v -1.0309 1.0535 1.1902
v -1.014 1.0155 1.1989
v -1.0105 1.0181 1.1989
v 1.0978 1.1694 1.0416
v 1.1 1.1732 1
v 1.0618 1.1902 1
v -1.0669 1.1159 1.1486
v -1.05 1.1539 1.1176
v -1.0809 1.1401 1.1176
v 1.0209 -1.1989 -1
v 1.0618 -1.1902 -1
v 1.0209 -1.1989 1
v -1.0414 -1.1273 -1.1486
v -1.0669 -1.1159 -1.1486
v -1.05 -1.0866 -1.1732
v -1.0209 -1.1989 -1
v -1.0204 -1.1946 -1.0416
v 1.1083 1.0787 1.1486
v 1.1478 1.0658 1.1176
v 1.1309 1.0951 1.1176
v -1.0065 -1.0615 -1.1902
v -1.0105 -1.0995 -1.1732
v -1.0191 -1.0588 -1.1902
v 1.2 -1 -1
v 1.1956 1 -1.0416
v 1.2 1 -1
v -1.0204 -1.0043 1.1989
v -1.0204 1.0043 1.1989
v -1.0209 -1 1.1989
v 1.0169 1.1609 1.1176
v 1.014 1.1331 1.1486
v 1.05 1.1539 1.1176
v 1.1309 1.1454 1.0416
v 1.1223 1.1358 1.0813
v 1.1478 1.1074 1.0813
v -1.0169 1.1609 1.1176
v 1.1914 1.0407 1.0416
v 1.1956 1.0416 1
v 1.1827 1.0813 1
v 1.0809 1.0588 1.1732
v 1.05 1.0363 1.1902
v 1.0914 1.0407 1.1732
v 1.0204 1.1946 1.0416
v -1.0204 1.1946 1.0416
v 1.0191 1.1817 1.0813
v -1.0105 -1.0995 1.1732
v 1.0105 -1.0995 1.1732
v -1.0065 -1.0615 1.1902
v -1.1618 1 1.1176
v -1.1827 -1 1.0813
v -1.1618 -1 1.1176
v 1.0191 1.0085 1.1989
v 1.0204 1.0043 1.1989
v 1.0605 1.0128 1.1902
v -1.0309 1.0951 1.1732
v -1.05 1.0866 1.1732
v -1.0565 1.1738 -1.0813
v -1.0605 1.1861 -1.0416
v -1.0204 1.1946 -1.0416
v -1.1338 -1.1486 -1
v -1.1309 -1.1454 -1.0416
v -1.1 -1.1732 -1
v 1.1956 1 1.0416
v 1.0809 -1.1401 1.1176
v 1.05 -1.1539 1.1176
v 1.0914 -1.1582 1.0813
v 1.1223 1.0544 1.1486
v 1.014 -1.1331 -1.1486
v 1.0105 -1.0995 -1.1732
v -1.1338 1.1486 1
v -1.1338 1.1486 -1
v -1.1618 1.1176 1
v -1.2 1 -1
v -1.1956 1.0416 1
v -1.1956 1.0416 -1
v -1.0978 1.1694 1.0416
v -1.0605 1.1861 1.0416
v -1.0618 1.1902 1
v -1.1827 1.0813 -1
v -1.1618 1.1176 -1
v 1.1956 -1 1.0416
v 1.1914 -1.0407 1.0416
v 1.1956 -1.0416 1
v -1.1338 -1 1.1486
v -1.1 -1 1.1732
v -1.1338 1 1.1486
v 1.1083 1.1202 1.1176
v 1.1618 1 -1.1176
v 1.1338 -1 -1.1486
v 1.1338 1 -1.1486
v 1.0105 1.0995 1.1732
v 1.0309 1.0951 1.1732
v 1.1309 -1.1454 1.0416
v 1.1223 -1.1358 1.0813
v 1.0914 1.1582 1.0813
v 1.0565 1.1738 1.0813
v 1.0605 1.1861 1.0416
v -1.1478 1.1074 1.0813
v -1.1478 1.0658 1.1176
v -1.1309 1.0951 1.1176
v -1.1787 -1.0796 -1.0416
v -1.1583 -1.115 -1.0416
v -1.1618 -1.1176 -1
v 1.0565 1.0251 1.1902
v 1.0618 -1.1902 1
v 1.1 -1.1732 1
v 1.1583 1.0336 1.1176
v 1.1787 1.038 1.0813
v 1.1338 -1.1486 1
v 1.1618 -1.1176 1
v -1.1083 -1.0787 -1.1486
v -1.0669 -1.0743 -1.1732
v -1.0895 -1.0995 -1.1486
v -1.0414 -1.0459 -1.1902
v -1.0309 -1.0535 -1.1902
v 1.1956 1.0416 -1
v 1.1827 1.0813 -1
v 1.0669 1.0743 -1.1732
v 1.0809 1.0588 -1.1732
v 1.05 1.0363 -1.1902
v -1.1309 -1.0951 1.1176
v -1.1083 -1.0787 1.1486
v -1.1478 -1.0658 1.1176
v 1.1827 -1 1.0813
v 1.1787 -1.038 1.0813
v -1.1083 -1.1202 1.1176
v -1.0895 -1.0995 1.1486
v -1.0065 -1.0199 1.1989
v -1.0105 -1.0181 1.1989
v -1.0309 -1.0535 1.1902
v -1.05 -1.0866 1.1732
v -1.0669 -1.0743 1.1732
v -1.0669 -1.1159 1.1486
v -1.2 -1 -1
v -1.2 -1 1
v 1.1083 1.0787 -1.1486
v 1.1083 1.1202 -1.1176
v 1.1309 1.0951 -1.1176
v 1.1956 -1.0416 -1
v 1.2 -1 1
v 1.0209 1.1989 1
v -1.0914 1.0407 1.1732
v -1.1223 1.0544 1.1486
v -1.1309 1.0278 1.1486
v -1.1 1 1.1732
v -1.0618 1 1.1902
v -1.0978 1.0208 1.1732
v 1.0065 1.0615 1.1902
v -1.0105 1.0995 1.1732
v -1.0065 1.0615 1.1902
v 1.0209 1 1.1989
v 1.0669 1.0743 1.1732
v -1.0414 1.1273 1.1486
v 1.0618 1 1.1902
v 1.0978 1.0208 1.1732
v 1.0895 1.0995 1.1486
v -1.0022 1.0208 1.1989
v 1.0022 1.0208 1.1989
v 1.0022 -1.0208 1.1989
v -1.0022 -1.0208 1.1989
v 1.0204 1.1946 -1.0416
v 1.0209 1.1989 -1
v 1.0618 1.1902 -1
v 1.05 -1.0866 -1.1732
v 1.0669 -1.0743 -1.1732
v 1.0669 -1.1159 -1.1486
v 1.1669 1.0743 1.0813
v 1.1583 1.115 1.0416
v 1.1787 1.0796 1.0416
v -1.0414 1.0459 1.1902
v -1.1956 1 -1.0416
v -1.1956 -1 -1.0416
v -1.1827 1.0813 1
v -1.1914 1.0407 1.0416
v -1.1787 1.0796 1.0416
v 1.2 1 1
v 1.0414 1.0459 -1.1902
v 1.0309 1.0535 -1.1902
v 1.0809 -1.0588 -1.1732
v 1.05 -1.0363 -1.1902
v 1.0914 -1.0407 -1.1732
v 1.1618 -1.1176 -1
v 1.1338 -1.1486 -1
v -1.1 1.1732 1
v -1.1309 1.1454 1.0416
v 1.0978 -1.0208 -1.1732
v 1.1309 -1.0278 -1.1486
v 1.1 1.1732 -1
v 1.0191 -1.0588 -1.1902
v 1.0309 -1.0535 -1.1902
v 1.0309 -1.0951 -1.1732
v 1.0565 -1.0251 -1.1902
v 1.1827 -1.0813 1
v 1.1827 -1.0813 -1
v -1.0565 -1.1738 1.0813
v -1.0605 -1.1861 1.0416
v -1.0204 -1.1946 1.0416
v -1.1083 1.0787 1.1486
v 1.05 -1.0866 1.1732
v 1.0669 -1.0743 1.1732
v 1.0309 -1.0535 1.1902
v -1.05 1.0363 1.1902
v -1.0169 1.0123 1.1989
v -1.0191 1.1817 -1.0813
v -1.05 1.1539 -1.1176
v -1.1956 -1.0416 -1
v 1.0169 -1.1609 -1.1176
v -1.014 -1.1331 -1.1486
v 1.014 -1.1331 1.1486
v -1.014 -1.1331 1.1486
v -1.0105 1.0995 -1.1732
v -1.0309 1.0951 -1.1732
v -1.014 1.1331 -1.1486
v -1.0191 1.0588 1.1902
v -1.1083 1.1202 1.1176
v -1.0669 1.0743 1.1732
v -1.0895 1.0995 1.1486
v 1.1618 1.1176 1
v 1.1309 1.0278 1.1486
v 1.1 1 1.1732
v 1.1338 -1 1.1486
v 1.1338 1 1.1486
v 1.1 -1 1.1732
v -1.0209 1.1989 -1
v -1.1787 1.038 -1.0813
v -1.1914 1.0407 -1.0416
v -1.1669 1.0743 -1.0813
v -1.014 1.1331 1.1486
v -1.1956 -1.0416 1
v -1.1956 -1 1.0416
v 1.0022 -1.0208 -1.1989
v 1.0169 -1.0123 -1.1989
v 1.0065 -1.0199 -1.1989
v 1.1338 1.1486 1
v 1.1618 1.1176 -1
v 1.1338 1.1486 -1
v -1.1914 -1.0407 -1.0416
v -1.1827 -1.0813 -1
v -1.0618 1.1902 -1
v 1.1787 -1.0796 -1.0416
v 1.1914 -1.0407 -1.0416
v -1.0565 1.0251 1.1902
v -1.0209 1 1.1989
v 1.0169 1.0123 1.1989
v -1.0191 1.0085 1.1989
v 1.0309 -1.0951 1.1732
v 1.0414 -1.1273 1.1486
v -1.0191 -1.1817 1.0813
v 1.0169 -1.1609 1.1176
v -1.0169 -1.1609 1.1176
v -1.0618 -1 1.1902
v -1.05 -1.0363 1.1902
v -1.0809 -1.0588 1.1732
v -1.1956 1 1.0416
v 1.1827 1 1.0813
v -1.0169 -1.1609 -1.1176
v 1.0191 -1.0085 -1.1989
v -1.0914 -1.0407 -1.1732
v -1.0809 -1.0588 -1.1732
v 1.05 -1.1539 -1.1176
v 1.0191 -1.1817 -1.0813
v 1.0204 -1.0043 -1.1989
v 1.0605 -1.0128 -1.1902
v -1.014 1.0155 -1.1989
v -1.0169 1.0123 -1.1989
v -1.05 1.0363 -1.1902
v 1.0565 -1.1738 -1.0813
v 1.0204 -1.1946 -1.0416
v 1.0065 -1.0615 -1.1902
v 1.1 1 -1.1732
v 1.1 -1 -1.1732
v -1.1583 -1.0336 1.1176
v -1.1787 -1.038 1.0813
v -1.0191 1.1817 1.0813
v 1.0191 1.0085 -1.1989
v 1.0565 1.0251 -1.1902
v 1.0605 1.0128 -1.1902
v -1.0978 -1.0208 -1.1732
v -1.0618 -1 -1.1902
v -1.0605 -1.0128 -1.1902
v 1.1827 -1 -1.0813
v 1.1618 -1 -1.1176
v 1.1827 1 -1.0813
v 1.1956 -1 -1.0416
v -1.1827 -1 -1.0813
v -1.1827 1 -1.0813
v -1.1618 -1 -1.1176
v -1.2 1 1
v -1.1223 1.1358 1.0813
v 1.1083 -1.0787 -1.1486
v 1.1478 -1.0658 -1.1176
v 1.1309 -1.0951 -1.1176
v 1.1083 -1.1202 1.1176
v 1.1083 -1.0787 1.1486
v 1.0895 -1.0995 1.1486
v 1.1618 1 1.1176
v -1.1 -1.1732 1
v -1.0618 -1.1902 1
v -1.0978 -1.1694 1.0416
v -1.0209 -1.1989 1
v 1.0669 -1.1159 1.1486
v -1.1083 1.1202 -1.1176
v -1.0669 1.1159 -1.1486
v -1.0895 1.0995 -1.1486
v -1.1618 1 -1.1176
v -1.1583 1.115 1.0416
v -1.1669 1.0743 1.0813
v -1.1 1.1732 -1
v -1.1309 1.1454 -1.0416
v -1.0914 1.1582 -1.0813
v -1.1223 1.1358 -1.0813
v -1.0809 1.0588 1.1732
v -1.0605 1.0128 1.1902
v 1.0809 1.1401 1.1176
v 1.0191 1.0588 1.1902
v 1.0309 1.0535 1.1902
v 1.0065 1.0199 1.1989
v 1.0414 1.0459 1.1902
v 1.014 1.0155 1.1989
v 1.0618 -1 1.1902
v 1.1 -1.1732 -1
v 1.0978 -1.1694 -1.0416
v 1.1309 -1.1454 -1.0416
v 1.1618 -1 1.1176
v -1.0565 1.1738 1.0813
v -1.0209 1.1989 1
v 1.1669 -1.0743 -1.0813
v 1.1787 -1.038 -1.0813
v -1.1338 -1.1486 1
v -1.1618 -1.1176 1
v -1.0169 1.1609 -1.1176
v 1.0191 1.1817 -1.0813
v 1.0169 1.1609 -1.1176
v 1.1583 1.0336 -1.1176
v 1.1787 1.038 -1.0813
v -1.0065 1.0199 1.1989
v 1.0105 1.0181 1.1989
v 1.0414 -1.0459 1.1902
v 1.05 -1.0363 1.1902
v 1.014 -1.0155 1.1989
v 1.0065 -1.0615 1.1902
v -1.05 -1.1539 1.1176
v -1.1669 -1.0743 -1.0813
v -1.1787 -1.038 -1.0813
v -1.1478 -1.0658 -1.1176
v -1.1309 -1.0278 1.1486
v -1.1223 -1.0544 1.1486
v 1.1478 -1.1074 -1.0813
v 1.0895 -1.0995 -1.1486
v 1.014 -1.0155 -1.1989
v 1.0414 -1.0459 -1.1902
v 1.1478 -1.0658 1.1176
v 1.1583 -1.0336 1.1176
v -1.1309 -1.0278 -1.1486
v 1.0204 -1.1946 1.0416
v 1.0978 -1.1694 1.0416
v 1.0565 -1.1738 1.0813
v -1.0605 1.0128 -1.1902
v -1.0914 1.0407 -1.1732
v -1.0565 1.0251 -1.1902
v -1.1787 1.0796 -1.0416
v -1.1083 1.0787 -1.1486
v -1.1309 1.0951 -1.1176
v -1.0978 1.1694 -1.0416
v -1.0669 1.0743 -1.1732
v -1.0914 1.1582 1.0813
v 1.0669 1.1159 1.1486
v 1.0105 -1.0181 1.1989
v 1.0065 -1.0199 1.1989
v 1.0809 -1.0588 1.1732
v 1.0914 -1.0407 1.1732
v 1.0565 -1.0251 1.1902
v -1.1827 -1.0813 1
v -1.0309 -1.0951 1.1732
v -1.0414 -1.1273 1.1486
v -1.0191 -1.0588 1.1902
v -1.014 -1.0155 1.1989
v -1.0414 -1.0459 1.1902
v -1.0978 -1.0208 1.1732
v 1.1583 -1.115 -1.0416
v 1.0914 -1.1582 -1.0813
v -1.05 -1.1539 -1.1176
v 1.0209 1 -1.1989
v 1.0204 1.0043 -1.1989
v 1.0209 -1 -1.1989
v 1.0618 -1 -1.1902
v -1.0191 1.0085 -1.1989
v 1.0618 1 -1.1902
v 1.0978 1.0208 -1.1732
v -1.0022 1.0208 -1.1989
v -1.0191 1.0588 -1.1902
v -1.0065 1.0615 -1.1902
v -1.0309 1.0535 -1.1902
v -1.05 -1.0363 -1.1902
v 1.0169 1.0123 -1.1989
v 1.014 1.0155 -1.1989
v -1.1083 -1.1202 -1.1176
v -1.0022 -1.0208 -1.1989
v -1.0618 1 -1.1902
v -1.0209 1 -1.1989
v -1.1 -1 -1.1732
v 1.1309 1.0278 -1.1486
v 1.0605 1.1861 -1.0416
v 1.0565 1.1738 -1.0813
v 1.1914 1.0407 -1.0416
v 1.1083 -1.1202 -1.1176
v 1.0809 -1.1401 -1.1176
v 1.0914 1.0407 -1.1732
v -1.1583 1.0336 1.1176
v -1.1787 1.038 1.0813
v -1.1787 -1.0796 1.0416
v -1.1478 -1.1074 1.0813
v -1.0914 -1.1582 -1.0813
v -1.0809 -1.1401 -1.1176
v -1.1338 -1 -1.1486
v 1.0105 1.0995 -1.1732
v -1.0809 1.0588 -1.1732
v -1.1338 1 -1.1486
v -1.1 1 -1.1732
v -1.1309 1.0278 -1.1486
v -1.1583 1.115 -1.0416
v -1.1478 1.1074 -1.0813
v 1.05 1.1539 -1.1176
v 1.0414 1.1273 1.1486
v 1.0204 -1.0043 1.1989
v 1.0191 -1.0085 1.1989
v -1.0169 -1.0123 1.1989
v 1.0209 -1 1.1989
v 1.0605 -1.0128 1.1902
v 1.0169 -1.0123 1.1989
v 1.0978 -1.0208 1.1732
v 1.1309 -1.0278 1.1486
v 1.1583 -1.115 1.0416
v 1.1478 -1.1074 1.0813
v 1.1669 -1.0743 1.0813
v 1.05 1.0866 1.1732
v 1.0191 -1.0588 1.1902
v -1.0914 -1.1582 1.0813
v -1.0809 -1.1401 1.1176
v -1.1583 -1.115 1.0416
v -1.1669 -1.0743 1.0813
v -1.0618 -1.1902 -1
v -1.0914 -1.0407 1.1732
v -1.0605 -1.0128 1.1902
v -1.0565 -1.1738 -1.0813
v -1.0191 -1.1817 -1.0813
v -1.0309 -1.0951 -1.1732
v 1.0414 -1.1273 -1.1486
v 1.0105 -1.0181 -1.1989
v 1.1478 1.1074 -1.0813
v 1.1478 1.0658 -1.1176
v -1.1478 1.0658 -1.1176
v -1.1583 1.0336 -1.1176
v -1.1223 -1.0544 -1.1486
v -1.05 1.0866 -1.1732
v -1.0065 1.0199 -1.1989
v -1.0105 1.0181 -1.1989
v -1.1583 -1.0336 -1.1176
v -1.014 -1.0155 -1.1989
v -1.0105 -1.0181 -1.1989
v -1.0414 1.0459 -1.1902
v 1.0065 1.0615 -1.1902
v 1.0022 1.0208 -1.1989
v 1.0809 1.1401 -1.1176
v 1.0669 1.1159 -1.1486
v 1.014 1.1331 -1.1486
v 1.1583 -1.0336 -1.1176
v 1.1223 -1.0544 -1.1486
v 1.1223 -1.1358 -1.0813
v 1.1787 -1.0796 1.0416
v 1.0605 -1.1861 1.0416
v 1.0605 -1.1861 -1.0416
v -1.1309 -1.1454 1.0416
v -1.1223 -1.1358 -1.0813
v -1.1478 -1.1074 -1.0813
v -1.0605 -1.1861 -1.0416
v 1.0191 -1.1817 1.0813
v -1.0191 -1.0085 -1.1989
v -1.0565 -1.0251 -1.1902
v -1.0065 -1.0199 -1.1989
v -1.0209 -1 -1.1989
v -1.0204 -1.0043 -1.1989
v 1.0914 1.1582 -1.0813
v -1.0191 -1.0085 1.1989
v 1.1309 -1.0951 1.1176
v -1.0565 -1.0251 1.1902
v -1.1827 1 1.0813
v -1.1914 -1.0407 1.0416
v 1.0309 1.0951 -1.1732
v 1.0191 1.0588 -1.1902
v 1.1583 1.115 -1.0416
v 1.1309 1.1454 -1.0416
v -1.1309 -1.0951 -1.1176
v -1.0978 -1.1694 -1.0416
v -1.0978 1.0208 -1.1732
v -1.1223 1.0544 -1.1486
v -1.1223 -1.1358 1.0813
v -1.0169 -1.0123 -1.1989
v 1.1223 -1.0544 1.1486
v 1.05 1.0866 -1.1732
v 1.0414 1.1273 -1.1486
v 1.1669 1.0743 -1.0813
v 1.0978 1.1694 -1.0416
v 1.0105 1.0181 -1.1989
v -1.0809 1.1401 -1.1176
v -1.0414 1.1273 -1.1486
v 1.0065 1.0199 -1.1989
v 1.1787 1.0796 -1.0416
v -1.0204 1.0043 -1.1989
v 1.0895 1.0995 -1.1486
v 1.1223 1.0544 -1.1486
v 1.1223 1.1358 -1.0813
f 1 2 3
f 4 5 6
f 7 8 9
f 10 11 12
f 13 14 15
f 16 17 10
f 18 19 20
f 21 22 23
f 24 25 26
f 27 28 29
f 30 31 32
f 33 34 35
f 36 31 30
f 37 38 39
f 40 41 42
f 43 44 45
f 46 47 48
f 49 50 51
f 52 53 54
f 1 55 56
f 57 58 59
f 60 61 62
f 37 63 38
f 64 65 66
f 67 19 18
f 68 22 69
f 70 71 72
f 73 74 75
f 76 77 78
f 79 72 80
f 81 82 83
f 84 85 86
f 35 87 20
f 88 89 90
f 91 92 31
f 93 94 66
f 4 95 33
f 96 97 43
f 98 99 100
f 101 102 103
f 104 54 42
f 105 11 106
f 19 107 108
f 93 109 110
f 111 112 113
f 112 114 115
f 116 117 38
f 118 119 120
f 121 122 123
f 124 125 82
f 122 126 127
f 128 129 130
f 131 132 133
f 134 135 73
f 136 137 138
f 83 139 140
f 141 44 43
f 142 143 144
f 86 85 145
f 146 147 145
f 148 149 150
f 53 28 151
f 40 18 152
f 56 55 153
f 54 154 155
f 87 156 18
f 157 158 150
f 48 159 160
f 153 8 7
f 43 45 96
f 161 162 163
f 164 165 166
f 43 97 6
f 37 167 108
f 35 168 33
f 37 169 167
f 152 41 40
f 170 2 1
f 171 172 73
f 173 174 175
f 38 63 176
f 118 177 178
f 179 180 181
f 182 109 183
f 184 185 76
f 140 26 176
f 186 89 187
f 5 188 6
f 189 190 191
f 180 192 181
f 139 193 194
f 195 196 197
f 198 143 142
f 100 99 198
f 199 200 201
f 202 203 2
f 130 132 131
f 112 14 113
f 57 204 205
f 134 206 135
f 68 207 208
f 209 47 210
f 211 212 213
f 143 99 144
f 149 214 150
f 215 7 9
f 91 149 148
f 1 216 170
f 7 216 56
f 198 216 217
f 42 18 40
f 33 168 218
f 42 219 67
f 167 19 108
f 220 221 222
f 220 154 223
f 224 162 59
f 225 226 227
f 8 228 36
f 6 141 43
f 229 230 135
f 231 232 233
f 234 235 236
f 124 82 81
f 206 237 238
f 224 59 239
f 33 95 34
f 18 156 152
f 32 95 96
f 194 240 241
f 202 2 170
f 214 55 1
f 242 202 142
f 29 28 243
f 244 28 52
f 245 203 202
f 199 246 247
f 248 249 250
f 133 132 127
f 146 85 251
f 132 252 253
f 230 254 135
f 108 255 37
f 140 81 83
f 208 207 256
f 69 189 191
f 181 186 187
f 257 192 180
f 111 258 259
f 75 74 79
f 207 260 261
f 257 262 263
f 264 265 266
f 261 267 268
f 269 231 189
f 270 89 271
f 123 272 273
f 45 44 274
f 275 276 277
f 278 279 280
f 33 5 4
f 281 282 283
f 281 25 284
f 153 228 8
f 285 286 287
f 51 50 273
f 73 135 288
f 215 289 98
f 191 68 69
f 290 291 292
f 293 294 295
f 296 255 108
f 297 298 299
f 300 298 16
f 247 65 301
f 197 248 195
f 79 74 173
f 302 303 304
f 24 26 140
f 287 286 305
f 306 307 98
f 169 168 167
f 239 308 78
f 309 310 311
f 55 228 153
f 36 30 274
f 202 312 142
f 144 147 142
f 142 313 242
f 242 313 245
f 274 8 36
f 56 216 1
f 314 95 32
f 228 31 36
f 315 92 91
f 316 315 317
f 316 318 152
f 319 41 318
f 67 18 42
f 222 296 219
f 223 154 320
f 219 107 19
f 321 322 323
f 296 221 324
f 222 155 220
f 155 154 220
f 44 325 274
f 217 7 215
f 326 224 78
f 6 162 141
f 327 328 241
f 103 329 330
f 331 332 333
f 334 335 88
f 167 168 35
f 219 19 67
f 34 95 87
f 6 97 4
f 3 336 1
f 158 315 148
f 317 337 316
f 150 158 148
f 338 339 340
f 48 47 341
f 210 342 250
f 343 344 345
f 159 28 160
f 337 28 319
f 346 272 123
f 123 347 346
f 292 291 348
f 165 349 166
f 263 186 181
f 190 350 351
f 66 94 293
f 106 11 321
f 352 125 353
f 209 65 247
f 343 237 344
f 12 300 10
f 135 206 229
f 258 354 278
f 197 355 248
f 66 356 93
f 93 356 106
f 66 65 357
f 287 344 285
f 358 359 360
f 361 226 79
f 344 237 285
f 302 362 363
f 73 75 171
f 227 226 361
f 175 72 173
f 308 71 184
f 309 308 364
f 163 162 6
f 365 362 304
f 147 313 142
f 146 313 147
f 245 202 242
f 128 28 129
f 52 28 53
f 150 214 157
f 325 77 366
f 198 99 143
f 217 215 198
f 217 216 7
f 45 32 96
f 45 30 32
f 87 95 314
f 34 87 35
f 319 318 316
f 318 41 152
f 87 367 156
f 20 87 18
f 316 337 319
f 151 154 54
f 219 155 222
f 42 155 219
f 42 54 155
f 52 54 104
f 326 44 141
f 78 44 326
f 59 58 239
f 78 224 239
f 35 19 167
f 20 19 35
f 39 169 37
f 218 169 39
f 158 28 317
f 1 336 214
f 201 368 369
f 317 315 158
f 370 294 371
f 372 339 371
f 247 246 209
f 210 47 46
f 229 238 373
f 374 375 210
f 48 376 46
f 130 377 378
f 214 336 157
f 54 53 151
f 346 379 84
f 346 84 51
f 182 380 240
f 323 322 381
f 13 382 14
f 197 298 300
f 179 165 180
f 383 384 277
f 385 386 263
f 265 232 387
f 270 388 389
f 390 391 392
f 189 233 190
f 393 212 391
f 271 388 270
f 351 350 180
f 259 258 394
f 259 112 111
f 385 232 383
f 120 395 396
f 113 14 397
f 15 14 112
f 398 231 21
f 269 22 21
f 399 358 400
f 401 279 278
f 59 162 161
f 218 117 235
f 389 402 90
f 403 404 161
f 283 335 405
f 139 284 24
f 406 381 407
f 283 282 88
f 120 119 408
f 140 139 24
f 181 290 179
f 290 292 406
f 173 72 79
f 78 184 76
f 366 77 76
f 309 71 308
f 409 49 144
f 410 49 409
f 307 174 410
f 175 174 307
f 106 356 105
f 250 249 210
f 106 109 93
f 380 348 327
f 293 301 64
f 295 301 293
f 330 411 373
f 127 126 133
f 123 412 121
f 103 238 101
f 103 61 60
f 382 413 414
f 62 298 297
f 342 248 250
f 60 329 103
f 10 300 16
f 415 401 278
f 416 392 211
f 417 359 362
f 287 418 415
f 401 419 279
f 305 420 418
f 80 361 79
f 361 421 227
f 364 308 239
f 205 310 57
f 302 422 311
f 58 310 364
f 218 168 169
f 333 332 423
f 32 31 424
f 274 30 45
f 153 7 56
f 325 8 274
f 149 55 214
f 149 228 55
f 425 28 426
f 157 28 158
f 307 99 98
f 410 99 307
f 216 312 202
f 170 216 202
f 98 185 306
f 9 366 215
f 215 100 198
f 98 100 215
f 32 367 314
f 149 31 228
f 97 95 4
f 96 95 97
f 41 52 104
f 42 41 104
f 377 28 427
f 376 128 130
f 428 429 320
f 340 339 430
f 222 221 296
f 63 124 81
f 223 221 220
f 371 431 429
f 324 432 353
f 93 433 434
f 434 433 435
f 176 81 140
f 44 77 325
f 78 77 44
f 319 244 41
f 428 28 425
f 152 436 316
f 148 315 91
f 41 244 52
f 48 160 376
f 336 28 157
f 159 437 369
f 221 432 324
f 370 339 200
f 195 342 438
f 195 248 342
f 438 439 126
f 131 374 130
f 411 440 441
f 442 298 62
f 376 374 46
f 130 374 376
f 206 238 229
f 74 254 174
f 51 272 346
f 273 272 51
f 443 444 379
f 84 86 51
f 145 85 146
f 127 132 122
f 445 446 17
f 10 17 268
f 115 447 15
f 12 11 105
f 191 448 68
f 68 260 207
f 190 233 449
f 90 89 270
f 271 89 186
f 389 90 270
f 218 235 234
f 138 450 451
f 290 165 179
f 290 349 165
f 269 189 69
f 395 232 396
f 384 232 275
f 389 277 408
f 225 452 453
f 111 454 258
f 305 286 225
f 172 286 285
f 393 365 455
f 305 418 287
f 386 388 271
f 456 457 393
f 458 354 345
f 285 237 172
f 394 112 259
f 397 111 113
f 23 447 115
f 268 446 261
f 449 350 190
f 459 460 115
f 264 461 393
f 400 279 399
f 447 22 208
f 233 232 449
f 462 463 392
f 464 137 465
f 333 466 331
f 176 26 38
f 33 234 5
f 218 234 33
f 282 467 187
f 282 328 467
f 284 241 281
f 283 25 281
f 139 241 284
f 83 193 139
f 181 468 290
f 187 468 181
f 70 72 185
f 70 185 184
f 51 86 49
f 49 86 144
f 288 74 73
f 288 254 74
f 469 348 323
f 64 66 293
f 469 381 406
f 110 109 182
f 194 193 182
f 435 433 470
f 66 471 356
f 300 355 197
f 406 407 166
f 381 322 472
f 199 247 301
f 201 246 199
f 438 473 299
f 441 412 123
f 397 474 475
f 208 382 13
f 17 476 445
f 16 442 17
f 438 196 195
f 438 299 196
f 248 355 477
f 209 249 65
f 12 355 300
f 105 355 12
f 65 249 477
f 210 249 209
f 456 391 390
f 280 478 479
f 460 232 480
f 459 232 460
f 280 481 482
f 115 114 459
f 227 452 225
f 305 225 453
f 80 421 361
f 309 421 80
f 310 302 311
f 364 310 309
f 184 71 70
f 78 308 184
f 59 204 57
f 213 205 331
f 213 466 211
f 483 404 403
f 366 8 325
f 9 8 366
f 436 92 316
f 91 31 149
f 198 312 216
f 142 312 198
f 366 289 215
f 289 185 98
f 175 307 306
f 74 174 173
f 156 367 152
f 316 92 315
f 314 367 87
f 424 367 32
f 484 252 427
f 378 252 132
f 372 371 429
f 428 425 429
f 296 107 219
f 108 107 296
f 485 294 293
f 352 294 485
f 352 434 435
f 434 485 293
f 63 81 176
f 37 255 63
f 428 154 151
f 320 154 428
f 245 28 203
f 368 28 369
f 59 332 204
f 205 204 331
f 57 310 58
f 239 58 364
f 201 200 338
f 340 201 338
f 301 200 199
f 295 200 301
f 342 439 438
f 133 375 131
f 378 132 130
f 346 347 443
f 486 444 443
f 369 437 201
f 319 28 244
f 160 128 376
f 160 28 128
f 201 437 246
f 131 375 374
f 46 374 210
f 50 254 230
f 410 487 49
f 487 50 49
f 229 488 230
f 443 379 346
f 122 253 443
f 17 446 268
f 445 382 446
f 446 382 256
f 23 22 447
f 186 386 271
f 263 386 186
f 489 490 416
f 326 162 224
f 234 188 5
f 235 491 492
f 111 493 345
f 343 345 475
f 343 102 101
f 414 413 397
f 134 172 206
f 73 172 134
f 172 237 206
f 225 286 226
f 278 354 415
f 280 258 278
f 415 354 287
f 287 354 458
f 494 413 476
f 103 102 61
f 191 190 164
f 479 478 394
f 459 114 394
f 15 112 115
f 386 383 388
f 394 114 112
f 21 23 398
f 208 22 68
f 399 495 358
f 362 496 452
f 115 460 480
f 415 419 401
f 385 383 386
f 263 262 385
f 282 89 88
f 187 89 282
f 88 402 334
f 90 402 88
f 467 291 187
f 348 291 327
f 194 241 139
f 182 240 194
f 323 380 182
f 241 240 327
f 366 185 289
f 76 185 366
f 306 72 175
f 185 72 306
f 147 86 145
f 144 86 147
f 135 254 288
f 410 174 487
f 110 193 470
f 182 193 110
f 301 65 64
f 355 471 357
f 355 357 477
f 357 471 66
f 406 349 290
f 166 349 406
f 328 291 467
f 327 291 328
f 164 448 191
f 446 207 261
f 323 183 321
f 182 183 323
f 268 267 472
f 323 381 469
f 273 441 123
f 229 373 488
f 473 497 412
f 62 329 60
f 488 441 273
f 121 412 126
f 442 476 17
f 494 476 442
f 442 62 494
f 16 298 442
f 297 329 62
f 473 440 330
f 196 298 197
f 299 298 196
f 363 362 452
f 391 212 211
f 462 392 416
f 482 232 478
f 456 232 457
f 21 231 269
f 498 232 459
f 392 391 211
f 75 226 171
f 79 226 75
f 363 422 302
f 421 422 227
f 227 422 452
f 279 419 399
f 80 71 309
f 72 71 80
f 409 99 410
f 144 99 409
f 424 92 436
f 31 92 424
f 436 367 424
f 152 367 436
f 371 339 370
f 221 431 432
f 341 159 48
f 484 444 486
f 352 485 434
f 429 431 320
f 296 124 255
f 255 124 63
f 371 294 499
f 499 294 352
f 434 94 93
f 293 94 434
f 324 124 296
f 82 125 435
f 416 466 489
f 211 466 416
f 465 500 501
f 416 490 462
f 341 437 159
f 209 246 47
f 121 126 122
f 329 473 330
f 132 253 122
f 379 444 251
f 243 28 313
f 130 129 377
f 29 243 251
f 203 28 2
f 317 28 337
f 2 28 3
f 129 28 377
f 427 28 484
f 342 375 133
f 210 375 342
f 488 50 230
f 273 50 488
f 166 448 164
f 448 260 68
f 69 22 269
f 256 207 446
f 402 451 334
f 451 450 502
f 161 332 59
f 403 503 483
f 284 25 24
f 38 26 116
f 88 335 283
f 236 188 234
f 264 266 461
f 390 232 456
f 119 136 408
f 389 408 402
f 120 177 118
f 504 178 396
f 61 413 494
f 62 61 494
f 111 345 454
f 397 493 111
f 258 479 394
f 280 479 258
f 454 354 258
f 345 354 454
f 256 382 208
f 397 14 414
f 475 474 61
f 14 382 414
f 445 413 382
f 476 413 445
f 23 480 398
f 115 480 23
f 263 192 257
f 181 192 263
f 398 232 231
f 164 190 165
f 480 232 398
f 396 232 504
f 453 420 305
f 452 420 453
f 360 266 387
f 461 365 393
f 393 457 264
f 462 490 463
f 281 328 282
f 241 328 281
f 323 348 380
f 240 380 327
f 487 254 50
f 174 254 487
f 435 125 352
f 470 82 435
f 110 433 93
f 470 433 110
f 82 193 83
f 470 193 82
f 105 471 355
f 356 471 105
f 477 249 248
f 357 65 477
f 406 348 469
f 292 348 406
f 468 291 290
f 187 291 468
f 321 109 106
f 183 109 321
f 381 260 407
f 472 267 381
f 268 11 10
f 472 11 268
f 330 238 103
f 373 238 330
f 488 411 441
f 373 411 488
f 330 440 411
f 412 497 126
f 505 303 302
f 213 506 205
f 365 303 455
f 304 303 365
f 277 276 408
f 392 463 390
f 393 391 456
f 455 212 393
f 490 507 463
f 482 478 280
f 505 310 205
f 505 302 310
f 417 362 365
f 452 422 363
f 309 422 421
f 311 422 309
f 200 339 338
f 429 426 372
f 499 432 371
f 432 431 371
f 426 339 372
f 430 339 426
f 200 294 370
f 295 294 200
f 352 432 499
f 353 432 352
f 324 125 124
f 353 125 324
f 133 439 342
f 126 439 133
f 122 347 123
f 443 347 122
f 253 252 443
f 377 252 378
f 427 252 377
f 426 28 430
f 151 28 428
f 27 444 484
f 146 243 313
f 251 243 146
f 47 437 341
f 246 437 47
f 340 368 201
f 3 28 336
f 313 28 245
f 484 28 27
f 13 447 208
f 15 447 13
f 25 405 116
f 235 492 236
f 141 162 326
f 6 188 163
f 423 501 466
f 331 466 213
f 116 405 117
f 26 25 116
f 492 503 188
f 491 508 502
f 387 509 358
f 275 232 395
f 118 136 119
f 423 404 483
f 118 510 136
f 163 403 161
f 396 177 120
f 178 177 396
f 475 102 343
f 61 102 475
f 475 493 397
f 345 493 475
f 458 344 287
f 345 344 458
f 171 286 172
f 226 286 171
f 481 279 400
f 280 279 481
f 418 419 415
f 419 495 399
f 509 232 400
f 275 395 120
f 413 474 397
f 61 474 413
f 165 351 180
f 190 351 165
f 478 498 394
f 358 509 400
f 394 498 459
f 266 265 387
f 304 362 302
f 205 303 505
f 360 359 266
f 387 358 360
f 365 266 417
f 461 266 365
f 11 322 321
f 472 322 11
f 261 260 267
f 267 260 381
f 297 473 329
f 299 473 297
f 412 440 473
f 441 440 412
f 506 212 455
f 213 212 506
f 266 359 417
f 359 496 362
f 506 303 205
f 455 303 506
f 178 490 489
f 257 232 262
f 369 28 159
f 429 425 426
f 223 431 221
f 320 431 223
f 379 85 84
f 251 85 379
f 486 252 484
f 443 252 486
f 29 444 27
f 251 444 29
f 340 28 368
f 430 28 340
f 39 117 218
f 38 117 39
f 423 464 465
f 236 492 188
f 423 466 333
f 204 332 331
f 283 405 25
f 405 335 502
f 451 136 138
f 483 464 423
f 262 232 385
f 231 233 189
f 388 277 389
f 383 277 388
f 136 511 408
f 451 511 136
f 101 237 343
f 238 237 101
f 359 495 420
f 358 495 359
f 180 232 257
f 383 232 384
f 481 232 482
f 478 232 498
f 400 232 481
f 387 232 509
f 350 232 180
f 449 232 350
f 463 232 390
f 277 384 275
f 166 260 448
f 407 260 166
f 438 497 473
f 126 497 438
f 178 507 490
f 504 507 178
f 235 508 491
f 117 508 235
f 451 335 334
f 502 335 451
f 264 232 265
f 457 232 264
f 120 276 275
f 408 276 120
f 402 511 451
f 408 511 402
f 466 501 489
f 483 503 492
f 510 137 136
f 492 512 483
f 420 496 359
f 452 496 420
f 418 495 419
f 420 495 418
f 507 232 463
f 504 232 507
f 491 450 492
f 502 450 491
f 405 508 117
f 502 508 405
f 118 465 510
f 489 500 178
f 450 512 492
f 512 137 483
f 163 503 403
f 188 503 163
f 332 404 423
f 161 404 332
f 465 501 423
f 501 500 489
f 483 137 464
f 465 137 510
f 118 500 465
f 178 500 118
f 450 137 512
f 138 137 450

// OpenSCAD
// a minimal rounded corner box using hull

$fn = 30;

module vertex() {
  sphere(r=0.2);
}

module edge() {
  union() {
    translate([0,  1, 0]) vertex();
    translate([0, -1, 0]) vertex();
  }
}

module square() {
  translate([ 1, 0, 0]) edge();
  translate([-1, 0, 0]) edge();
}

module cube() {
    translate([0, 0,  1]) square();
    translate([0, 0, -1]) square();
}

hull() {
  cube();
}
